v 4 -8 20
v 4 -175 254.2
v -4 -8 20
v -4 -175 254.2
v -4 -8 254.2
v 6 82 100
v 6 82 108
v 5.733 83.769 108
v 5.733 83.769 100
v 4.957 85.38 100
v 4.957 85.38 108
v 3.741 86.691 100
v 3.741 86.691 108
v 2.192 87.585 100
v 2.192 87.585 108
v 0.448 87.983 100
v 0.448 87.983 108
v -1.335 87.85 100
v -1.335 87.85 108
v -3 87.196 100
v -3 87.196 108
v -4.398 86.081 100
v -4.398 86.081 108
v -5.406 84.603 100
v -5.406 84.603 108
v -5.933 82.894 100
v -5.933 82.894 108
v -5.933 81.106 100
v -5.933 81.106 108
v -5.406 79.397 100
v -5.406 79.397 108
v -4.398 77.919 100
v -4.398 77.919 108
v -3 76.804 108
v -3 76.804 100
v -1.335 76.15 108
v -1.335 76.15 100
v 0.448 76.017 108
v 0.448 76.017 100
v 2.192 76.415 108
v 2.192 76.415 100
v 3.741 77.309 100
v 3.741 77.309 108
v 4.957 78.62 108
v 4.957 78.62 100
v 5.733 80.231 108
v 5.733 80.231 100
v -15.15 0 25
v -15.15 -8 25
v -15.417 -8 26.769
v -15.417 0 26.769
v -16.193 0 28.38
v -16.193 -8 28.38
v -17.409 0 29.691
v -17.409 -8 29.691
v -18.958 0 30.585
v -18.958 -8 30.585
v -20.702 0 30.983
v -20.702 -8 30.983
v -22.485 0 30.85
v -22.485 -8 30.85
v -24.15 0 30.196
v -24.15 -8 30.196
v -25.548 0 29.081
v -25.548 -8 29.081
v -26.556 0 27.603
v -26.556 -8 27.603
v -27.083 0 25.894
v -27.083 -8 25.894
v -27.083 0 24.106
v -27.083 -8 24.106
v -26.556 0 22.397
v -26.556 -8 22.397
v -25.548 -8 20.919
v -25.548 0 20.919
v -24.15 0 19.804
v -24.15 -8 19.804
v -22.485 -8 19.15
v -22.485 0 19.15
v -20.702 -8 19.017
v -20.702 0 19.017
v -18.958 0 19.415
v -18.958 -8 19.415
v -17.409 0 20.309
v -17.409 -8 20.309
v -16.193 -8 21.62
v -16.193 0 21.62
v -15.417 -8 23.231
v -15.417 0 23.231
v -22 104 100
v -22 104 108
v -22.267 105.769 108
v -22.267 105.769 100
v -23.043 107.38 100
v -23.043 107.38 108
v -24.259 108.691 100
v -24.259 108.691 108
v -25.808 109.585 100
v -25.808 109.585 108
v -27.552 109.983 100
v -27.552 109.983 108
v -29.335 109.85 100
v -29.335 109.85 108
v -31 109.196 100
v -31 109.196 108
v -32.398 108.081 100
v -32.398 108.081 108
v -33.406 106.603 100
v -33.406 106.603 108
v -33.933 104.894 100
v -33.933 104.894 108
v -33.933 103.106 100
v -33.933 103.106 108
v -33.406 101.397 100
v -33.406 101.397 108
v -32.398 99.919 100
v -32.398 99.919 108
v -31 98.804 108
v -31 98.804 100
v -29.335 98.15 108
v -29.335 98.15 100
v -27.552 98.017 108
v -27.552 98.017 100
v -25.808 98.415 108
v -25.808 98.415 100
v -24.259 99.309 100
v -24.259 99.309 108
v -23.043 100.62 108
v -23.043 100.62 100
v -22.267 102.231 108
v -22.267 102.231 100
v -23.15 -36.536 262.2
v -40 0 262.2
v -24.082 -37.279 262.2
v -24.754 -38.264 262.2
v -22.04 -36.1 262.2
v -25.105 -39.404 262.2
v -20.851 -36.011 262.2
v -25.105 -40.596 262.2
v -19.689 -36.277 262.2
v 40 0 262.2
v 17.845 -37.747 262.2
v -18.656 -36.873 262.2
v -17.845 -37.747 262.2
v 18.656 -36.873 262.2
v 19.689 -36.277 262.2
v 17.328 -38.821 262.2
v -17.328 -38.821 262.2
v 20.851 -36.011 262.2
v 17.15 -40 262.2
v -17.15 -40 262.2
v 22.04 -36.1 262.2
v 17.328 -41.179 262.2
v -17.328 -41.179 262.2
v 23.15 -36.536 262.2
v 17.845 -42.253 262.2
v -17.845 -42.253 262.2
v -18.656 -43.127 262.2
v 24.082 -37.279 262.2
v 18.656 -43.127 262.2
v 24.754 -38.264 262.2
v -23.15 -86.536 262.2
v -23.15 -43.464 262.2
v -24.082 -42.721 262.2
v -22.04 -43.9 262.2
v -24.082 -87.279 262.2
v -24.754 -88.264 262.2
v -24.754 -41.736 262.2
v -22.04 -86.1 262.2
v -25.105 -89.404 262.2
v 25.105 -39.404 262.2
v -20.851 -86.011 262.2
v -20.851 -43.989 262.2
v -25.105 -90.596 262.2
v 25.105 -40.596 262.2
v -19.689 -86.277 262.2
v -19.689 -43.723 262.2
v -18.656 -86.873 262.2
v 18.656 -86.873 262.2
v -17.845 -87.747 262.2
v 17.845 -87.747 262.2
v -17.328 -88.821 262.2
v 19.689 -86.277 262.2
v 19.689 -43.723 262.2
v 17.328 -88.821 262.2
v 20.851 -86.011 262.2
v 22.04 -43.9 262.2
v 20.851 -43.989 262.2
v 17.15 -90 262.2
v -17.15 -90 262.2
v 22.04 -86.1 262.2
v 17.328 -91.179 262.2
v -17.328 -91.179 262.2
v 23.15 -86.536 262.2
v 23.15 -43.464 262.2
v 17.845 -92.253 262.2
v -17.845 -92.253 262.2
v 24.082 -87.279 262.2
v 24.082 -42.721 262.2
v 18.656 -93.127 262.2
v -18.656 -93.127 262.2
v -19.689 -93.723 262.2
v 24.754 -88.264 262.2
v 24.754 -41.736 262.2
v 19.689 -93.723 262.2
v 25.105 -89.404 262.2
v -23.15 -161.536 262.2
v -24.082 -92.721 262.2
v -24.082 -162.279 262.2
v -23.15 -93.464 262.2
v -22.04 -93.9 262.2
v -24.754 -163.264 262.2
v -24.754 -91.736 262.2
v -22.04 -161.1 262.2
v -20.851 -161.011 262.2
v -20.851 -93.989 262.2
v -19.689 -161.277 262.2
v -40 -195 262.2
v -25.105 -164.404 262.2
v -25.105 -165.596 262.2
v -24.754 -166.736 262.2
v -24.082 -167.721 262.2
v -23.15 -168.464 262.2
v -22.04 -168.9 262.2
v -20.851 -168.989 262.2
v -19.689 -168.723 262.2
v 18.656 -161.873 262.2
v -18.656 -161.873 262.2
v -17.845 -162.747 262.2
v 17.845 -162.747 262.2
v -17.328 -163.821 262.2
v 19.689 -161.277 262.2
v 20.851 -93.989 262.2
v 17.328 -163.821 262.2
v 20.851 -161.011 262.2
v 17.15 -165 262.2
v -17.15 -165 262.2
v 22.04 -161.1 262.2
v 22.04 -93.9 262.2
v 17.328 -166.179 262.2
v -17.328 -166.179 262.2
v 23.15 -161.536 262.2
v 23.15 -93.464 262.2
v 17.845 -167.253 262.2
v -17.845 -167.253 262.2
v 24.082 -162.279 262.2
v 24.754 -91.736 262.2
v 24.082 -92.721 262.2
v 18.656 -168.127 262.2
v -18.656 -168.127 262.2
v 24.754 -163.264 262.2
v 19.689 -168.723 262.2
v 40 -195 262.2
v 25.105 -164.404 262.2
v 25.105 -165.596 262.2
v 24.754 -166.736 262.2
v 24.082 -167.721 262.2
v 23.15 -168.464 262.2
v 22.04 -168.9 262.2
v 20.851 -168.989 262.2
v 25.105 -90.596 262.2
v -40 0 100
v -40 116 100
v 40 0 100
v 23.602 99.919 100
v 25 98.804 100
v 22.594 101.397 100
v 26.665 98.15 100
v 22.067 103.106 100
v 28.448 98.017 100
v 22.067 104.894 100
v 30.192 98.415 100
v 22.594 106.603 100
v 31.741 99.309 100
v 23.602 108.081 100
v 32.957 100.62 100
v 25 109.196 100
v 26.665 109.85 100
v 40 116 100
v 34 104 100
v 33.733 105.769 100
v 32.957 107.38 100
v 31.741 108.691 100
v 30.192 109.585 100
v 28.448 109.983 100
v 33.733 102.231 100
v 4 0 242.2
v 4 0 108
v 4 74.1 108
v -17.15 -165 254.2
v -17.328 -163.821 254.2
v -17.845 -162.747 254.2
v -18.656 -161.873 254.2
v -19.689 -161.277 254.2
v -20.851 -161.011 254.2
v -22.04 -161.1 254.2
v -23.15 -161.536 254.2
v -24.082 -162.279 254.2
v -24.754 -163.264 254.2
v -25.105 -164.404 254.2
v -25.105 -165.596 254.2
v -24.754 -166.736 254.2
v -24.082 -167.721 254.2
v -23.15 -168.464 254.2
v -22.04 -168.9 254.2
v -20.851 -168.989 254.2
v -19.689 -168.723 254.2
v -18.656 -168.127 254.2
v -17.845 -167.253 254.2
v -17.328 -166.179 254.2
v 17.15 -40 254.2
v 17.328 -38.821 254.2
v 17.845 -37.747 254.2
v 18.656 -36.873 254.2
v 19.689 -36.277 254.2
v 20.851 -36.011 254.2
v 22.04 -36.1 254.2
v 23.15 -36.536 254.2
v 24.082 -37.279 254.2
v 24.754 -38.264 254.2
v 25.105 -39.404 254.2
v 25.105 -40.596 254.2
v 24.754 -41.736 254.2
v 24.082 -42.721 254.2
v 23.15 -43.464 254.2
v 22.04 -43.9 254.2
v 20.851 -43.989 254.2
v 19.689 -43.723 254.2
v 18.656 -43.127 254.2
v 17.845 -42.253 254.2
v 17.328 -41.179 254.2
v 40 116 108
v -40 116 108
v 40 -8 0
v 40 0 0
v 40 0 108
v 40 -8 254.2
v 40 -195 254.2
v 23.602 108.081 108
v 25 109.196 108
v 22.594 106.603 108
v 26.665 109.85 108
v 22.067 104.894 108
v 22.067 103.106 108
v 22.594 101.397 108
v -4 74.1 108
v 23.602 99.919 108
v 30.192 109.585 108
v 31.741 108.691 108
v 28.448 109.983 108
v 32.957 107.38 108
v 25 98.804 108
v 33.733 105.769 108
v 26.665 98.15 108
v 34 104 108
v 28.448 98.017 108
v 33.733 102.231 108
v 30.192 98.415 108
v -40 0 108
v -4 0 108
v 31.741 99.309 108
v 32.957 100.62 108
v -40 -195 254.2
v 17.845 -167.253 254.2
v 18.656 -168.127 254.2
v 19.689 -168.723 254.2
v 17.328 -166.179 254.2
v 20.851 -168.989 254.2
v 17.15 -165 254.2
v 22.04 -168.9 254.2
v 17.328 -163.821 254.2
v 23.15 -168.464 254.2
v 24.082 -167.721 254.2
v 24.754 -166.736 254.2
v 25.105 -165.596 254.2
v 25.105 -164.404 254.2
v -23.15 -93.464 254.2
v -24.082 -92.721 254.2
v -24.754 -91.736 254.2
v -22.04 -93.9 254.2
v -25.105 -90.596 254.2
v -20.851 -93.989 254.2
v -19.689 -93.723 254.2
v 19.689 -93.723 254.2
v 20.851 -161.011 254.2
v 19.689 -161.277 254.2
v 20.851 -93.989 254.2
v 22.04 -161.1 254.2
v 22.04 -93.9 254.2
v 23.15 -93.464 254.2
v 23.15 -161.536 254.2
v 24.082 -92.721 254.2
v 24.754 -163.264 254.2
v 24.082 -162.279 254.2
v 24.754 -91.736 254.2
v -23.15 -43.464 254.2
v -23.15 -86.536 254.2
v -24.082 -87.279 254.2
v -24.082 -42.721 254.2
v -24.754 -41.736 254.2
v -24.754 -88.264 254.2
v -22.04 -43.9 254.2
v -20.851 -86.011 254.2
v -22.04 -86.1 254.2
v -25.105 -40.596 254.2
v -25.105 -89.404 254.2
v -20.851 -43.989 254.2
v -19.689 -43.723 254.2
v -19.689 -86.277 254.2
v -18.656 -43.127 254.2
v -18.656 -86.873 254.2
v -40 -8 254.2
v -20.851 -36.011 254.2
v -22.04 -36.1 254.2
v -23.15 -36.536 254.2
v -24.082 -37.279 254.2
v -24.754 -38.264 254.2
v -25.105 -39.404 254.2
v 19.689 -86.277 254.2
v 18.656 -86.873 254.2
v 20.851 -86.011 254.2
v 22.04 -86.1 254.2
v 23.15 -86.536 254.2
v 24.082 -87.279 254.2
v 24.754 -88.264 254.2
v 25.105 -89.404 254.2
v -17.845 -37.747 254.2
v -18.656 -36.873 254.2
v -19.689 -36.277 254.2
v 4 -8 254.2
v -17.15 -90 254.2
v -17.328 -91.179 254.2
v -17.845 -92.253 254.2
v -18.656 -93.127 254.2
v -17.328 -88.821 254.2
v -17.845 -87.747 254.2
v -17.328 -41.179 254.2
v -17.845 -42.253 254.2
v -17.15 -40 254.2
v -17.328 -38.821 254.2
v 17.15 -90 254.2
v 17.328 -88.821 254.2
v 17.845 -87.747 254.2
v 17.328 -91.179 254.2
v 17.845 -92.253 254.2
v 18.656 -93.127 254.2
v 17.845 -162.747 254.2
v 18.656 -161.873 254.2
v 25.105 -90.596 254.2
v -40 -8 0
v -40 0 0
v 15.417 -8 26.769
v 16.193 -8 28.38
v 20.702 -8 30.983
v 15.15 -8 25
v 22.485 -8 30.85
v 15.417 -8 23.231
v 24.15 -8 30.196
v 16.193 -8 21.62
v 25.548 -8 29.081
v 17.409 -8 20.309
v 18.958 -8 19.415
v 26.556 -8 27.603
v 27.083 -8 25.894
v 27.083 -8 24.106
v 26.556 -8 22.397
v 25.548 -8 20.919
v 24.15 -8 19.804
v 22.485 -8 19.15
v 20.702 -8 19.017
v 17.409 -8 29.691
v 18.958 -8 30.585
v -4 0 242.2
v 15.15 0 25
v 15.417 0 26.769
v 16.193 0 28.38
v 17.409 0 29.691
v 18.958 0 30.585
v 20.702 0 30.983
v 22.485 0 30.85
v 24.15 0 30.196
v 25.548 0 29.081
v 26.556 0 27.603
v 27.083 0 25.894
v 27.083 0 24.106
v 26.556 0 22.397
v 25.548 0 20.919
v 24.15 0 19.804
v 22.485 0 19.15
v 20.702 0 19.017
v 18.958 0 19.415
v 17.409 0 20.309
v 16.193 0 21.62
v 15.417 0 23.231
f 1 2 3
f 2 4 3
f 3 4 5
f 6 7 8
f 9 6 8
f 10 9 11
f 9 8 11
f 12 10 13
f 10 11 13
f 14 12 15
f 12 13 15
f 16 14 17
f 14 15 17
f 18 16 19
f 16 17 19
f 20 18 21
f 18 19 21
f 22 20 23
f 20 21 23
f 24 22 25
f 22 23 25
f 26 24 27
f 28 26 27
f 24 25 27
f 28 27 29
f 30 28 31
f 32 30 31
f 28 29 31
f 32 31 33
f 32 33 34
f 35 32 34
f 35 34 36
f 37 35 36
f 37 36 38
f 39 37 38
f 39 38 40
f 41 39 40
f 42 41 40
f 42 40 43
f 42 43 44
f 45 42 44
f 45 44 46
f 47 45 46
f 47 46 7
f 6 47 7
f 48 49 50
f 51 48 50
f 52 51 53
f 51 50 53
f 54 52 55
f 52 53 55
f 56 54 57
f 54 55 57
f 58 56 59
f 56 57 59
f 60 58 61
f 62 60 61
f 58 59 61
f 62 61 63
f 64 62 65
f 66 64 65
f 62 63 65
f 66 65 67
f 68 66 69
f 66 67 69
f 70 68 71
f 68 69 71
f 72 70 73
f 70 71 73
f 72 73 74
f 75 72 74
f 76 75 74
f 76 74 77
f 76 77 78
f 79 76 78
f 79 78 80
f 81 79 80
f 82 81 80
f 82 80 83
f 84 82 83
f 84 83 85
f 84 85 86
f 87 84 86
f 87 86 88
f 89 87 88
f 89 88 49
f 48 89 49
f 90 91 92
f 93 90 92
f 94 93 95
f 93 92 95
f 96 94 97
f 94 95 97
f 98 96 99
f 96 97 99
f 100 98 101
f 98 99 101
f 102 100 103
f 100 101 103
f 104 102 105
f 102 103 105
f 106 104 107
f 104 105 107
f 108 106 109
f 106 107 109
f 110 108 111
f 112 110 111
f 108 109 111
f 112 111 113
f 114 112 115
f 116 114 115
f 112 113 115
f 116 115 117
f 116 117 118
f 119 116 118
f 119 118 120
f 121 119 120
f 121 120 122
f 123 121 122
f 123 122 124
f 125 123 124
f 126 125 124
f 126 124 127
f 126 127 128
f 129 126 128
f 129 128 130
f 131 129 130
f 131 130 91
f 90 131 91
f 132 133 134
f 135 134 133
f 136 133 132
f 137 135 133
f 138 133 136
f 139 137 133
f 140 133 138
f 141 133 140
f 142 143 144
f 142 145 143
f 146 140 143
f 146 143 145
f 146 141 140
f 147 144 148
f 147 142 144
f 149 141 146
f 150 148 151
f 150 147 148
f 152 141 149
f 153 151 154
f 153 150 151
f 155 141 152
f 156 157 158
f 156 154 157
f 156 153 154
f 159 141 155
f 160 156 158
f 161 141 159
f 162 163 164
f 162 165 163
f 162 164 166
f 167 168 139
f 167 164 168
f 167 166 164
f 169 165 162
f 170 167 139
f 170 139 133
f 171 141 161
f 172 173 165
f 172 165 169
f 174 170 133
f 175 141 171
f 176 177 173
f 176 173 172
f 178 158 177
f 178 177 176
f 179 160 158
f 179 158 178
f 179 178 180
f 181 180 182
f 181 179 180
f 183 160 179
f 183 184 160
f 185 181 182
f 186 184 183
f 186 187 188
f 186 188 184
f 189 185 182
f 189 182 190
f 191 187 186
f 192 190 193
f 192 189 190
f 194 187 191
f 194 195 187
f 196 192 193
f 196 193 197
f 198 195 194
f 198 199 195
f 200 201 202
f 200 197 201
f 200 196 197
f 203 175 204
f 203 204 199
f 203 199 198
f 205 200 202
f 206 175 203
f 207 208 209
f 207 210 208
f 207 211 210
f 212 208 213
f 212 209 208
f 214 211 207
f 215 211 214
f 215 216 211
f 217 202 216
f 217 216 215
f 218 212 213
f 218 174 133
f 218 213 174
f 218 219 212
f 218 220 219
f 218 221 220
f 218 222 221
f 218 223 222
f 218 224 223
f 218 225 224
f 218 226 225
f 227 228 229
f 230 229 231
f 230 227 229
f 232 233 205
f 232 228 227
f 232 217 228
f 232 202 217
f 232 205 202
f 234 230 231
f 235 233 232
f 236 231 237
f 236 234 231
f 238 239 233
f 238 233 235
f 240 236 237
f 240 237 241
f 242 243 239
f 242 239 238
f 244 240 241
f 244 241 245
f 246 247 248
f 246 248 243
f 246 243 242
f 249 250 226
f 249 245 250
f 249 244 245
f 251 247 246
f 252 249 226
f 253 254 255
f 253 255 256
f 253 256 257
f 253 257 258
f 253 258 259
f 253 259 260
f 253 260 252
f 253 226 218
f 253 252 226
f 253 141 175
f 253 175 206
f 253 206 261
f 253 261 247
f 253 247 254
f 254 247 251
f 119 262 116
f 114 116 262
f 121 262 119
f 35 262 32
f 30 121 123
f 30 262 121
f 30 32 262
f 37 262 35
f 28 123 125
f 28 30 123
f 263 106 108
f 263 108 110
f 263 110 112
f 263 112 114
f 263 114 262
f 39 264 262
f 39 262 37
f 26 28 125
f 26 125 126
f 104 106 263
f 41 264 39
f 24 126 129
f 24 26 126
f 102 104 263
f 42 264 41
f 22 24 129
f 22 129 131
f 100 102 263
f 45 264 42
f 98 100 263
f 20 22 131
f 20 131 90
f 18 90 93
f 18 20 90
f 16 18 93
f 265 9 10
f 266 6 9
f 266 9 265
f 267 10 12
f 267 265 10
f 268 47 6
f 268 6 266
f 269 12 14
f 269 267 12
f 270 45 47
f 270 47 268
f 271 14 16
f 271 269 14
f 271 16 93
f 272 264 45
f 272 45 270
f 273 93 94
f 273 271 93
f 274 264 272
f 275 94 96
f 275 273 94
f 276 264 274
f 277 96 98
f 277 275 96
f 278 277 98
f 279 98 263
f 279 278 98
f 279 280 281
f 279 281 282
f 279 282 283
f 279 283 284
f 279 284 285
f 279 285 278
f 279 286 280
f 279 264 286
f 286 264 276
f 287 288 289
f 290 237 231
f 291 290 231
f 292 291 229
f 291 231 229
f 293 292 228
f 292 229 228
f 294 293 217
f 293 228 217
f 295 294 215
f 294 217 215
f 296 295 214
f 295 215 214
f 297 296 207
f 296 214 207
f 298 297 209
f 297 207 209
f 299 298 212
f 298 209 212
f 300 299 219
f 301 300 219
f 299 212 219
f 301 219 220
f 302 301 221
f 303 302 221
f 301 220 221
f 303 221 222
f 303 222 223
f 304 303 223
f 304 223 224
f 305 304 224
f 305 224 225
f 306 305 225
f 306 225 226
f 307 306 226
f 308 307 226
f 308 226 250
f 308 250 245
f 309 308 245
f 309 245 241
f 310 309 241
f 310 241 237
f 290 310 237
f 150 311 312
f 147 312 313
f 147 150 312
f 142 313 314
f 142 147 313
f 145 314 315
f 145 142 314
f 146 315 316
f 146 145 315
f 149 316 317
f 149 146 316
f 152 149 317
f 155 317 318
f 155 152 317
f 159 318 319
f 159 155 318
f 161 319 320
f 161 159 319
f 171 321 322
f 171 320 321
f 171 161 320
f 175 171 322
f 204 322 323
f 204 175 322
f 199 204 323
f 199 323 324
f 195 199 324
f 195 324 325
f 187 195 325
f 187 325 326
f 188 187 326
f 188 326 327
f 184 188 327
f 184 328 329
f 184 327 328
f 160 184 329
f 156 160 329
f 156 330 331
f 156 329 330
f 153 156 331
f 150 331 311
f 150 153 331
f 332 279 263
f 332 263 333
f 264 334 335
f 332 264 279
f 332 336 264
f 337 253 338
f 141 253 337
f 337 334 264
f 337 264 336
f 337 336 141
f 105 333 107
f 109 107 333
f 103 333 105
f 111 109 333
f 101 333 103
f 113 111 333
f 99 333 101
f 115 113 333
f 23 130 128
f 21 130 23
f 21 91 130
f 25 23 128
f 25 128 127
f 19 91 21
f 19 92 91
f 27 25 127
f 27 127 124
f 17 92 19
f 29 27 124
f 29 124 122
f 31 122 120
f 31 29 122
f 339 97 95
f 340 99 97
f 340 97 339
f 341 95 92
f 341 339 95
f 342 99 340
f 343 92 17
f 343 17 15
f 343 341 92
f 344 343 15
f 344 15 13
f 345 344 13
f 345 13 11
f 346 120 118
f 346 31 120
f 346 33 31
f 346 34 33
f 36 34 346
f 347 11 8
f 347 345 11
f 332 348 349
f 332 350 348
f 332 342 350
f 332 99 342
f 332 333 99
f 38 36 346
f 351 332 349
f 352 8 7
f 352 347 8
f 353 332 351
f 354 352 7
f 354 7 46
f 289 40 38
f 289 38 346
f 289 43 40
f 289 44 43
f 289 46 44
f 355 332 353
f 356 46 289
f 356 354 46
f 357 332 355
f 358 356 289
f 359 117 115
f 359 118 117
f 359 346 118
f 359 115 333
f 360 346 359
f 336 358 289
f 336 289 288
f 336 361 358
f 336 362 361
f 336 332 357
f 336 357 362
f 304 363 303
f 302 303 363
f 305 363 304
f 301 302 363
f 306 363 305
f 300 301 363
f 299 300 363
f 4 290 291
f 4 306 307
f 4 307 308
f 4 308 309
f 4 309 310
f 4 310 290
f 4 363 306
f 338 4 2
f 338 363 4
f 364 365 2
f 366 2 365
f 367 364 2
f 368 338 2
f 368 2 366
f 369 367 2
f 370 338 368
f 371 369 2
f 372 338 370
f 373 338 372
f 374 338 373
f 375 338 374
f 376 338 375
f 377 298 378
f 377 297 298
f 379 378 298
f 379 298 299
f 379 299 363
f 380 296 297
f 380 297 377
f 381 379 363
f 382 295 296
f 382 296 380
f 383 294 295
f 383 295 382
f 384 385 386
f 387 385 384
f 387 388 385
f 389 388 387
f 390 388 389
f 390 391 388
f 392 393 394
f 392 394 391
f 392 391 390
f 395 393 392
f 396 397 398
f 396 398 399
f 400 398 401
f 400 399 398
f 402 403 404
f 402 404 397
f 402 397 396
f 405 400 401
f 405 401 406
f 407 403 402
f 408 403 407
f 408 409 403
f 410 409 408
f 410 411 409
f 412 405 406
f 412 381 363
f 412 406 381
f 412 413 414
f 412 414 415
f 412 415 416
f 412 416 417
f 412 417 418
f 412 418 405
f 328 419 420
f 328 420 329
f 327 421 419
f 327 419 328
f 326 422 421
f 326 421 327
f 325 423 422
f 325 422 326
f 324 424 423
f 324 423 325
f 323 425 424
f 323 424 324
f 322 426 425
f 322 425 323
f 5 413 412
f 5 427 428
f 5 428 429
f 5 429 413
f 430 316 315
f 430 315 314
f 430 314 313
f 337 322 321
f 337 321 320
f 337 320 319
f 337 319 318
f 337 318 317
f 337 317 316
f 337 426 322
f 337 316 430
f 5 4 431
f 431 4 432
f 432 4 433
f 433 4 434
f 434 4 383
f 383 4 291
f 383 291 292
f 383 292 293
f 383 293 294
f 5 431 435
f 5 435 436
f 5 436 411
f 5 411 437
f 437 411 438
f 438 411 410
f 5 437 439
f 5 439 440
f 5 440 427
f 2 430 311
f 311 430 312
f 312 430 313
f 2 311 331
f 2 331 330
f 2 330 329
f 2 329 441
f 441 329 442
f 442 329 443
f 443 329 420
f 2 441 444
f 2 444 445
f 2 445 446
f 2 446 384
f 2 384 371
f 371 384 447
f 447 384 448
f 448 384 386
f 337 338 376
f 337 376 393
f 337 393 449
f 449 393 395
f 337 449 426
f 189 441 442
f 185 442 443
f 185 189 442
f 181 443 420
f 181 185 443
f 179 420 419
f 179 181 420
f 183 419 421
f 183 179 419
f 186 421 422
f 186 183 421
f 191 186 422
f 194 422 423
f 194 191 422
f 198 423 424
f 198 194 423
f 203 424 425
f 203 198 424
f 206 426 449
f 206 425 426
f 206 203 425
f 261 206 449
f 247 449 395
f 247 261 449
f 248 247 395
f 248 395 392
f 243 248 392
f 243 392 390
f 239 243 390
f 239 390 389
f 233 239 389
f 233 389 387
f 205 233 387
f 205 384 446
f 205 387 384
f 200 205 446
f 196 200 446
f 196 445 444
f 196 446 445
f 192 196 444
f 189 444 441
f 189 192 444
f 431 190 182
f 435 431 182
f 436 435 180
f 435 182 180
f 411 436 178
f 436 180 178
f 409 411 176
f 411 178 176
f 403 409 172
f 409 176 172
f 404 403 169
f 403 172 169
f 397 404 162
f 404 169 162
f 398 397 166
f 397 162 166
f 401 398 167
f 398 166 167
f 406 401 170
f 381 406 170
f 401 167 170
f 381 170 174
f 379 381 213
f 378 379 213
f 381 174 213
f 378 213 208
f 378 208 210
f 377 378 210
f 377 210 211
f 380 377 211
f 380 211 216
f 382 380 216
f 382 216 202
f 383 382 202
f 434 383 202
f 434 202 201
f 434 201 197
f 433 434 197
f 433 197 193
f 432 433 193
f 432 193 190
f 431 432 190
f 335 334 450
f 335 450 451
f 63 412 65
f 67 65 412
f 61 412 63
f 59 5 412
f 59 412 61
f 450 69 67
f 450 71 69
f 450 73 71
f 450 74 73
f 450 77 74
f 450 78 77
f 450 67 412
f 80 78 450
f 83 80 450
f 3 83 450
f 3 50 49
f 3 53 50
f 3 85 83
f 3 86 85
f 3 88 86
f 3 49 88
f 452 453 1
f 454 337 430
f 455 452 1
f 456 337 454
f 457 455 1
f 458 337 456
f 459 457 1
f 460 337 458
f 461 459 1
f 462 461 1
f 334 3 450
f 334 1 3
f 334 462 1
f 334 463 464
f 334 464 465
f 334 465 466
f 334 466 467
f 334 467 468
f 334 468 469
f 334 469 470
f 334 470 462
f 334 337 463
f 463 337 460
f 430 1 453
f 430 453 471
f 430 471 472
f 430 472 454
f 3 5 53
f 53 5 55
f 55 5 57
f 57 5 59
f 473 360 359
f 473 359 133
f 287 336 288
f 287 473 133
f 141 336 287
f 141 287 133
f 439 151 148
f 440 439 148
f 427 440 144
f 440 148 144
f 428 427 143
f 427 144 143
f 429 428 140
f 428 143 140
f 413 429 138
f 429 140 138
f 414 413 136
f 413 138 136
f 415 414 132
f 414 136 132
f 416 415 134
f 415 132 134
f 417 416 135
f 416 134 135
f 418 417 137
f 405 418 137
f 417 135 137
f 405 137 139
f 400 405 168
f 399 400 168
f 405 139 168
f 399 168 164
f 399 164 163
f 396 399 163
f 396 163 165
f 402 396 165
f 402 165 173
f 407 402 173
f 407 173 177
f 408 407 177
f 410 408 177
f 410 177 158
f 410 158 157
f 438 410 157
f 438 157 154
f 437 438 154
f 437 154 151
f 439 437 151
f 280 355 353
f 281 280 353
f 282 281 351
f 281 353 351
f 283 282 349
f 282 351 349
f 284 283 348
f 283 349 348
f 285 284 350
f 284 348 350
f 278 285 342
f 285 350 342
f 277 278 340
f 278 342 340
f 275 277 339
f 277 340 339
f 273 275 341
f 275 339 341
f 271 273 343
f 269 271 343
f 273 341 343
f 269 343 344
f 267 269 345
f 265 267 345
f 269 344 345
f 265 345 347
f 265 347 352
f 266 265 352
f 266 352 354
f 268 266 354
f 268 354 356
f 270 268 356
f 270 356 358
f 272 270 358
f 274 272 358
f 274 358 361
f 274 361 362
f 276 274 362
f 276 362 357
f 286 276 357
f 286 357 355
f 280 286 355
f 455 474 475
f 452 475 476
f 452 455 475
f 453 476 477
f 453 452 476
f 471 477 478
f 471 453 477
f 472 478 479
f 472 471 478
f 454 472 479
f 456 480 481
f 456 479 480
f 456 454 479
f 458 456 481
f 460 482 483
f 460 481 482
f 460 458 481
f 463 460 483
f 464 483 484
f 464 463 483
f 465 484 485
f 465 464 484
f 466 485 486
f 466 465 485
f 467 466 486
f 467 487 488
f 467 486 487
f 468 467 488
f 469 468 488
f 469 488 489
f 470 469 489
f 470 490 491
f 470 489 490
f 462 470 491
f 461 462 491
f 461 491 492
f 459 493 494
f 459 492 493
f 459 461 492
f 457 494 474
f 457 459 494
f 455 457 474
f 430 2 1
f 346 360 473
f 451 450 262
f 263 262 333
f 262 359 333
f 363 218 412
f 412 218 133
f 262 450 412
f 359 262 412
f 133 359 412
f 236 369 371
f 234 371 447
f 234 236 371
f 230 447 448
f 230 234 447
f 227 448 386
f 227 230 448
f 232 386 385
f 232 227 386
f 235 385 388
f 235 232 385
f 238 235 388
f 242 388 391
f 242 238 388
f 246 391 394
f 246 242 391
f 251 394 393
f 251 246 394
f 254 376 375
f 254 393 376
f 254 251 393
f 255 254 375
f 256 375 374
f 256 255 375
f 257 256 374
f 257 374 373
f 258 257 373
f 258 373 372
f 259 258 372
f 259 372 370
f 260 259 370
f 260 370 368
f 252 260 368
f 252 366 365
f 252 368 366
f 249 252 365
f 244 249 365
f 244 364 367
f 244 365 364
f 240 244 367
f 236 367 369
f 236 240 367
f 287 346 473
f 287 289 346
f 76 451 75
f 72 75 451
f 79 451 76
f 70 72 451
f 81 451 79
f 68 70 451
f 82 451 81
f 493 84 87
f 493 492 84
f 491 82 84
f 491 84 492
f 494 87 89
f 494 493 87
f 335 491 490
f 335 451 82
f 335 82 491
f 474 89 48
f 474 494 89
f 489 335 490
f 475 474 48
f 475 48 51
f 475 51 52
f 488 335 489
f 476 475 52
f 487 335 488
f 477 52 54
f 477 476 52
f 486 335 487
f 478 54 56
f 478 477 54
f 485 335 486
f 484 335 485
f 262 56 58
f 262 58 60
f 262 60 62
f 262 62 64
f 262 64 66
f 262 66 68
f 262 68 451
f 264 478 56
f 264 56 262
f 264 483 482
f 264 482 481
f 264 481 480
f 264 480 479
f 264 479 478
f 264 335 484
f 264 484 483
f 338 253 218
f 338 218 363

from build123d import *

# Parameters (mm, degrees)
F1_DEPTH = 40
F2_DEPTH = 4
F3_R     = 4
F4_DEPTH = 262.201
F5_R     = 6
F6_DEPTH = 124.001
F7_R     = 6
F8_DEPTH = 108.001


# Not quite as in the source:
# - a pattern or mirror of a feature is missing from the dataset's text; its kind, count and spacing are read off the source's solid


with BuildPart() as f1:
    # F0 (on Right) → F1 (new body, symmetric)
    with BuildSketch(Plane.YZ):
        Polygon((0, 262.2), (-195, 262.2), (-195, 254.2), (-175, 254.2), (-8, 254.2), (-8, 20), (-8, 0), (0, 0), (0, 100), (0, 108), (0, 242.2), align=None)
        Polygon((74.1, 108), (0, 108), (0, 100), (116, 100), (116, 108), align=None)
    extrude(amount=F1_DEPTH, both=True)

    # F0 (on Right) → F2 (join, symmetric)
    with BuildSketch(Plane.YZ):
        Polygon((-8, 254.2), (-175, 254.2), (-8, 20), align=None)
        Polygon((74.1, 108), (0, 242.2), (0, 108), align=None)
    extrude(amount=F2_DEPTH, both=True)

    # F3 (on face) → F4 (cut, through all)
    with BuildSketch(Plane.XY.offset(262.2)):
        with Locations((-21.15, -40)):
            Circle(F3_R)
        with Locations((-21.15, -90)):
            Circle(F3_R)
        with Locations((-21.15, -165)):
            Circle(F3_R)
    f4 = extrude(amount=-F4_DEPTH, mode=Mode.SUBTRACT)

    # F4_copies: F4 across plane
    add(f4.mirror(Plane(origin=(0, 0, 0), x_dir=(0, 0, 1), z_dir=(1, 0, 0))), mode=Mode.SUBTRACT)

    # F5 (on face) → F6 (cut, through all)
    with BuildSketch(Plane.XZ.offset(8)):
        with Locations((-21.15, 25)):
            Circle(F5_R)
    f6 = extrude(amount=-F6_DEPTH, mode=Mode.SUBTRACT)

    # F6_copies: F6 across plane
    add(f6.mirror(Plane(origin=(0, 0, 0), x_dir=(0, 0, 1), z_dir=(1, 0, 0))), mode=Mode.SUBTRACT)

    # F7 (on face) → F8 (cut, through all)
    with BuildSketch(Plane.XY.offset(108)):
        with Locations((-28, 104)):
            Circle(F7_R)
        with Locations((0, 82)):
            Circle(F7_R)
        with Locations((28, 104)):
            Circle(F7_R)
    extrude(amount=-F8_DEPTH, mode=Mode.SUBTRACT)


solid = f1.part
